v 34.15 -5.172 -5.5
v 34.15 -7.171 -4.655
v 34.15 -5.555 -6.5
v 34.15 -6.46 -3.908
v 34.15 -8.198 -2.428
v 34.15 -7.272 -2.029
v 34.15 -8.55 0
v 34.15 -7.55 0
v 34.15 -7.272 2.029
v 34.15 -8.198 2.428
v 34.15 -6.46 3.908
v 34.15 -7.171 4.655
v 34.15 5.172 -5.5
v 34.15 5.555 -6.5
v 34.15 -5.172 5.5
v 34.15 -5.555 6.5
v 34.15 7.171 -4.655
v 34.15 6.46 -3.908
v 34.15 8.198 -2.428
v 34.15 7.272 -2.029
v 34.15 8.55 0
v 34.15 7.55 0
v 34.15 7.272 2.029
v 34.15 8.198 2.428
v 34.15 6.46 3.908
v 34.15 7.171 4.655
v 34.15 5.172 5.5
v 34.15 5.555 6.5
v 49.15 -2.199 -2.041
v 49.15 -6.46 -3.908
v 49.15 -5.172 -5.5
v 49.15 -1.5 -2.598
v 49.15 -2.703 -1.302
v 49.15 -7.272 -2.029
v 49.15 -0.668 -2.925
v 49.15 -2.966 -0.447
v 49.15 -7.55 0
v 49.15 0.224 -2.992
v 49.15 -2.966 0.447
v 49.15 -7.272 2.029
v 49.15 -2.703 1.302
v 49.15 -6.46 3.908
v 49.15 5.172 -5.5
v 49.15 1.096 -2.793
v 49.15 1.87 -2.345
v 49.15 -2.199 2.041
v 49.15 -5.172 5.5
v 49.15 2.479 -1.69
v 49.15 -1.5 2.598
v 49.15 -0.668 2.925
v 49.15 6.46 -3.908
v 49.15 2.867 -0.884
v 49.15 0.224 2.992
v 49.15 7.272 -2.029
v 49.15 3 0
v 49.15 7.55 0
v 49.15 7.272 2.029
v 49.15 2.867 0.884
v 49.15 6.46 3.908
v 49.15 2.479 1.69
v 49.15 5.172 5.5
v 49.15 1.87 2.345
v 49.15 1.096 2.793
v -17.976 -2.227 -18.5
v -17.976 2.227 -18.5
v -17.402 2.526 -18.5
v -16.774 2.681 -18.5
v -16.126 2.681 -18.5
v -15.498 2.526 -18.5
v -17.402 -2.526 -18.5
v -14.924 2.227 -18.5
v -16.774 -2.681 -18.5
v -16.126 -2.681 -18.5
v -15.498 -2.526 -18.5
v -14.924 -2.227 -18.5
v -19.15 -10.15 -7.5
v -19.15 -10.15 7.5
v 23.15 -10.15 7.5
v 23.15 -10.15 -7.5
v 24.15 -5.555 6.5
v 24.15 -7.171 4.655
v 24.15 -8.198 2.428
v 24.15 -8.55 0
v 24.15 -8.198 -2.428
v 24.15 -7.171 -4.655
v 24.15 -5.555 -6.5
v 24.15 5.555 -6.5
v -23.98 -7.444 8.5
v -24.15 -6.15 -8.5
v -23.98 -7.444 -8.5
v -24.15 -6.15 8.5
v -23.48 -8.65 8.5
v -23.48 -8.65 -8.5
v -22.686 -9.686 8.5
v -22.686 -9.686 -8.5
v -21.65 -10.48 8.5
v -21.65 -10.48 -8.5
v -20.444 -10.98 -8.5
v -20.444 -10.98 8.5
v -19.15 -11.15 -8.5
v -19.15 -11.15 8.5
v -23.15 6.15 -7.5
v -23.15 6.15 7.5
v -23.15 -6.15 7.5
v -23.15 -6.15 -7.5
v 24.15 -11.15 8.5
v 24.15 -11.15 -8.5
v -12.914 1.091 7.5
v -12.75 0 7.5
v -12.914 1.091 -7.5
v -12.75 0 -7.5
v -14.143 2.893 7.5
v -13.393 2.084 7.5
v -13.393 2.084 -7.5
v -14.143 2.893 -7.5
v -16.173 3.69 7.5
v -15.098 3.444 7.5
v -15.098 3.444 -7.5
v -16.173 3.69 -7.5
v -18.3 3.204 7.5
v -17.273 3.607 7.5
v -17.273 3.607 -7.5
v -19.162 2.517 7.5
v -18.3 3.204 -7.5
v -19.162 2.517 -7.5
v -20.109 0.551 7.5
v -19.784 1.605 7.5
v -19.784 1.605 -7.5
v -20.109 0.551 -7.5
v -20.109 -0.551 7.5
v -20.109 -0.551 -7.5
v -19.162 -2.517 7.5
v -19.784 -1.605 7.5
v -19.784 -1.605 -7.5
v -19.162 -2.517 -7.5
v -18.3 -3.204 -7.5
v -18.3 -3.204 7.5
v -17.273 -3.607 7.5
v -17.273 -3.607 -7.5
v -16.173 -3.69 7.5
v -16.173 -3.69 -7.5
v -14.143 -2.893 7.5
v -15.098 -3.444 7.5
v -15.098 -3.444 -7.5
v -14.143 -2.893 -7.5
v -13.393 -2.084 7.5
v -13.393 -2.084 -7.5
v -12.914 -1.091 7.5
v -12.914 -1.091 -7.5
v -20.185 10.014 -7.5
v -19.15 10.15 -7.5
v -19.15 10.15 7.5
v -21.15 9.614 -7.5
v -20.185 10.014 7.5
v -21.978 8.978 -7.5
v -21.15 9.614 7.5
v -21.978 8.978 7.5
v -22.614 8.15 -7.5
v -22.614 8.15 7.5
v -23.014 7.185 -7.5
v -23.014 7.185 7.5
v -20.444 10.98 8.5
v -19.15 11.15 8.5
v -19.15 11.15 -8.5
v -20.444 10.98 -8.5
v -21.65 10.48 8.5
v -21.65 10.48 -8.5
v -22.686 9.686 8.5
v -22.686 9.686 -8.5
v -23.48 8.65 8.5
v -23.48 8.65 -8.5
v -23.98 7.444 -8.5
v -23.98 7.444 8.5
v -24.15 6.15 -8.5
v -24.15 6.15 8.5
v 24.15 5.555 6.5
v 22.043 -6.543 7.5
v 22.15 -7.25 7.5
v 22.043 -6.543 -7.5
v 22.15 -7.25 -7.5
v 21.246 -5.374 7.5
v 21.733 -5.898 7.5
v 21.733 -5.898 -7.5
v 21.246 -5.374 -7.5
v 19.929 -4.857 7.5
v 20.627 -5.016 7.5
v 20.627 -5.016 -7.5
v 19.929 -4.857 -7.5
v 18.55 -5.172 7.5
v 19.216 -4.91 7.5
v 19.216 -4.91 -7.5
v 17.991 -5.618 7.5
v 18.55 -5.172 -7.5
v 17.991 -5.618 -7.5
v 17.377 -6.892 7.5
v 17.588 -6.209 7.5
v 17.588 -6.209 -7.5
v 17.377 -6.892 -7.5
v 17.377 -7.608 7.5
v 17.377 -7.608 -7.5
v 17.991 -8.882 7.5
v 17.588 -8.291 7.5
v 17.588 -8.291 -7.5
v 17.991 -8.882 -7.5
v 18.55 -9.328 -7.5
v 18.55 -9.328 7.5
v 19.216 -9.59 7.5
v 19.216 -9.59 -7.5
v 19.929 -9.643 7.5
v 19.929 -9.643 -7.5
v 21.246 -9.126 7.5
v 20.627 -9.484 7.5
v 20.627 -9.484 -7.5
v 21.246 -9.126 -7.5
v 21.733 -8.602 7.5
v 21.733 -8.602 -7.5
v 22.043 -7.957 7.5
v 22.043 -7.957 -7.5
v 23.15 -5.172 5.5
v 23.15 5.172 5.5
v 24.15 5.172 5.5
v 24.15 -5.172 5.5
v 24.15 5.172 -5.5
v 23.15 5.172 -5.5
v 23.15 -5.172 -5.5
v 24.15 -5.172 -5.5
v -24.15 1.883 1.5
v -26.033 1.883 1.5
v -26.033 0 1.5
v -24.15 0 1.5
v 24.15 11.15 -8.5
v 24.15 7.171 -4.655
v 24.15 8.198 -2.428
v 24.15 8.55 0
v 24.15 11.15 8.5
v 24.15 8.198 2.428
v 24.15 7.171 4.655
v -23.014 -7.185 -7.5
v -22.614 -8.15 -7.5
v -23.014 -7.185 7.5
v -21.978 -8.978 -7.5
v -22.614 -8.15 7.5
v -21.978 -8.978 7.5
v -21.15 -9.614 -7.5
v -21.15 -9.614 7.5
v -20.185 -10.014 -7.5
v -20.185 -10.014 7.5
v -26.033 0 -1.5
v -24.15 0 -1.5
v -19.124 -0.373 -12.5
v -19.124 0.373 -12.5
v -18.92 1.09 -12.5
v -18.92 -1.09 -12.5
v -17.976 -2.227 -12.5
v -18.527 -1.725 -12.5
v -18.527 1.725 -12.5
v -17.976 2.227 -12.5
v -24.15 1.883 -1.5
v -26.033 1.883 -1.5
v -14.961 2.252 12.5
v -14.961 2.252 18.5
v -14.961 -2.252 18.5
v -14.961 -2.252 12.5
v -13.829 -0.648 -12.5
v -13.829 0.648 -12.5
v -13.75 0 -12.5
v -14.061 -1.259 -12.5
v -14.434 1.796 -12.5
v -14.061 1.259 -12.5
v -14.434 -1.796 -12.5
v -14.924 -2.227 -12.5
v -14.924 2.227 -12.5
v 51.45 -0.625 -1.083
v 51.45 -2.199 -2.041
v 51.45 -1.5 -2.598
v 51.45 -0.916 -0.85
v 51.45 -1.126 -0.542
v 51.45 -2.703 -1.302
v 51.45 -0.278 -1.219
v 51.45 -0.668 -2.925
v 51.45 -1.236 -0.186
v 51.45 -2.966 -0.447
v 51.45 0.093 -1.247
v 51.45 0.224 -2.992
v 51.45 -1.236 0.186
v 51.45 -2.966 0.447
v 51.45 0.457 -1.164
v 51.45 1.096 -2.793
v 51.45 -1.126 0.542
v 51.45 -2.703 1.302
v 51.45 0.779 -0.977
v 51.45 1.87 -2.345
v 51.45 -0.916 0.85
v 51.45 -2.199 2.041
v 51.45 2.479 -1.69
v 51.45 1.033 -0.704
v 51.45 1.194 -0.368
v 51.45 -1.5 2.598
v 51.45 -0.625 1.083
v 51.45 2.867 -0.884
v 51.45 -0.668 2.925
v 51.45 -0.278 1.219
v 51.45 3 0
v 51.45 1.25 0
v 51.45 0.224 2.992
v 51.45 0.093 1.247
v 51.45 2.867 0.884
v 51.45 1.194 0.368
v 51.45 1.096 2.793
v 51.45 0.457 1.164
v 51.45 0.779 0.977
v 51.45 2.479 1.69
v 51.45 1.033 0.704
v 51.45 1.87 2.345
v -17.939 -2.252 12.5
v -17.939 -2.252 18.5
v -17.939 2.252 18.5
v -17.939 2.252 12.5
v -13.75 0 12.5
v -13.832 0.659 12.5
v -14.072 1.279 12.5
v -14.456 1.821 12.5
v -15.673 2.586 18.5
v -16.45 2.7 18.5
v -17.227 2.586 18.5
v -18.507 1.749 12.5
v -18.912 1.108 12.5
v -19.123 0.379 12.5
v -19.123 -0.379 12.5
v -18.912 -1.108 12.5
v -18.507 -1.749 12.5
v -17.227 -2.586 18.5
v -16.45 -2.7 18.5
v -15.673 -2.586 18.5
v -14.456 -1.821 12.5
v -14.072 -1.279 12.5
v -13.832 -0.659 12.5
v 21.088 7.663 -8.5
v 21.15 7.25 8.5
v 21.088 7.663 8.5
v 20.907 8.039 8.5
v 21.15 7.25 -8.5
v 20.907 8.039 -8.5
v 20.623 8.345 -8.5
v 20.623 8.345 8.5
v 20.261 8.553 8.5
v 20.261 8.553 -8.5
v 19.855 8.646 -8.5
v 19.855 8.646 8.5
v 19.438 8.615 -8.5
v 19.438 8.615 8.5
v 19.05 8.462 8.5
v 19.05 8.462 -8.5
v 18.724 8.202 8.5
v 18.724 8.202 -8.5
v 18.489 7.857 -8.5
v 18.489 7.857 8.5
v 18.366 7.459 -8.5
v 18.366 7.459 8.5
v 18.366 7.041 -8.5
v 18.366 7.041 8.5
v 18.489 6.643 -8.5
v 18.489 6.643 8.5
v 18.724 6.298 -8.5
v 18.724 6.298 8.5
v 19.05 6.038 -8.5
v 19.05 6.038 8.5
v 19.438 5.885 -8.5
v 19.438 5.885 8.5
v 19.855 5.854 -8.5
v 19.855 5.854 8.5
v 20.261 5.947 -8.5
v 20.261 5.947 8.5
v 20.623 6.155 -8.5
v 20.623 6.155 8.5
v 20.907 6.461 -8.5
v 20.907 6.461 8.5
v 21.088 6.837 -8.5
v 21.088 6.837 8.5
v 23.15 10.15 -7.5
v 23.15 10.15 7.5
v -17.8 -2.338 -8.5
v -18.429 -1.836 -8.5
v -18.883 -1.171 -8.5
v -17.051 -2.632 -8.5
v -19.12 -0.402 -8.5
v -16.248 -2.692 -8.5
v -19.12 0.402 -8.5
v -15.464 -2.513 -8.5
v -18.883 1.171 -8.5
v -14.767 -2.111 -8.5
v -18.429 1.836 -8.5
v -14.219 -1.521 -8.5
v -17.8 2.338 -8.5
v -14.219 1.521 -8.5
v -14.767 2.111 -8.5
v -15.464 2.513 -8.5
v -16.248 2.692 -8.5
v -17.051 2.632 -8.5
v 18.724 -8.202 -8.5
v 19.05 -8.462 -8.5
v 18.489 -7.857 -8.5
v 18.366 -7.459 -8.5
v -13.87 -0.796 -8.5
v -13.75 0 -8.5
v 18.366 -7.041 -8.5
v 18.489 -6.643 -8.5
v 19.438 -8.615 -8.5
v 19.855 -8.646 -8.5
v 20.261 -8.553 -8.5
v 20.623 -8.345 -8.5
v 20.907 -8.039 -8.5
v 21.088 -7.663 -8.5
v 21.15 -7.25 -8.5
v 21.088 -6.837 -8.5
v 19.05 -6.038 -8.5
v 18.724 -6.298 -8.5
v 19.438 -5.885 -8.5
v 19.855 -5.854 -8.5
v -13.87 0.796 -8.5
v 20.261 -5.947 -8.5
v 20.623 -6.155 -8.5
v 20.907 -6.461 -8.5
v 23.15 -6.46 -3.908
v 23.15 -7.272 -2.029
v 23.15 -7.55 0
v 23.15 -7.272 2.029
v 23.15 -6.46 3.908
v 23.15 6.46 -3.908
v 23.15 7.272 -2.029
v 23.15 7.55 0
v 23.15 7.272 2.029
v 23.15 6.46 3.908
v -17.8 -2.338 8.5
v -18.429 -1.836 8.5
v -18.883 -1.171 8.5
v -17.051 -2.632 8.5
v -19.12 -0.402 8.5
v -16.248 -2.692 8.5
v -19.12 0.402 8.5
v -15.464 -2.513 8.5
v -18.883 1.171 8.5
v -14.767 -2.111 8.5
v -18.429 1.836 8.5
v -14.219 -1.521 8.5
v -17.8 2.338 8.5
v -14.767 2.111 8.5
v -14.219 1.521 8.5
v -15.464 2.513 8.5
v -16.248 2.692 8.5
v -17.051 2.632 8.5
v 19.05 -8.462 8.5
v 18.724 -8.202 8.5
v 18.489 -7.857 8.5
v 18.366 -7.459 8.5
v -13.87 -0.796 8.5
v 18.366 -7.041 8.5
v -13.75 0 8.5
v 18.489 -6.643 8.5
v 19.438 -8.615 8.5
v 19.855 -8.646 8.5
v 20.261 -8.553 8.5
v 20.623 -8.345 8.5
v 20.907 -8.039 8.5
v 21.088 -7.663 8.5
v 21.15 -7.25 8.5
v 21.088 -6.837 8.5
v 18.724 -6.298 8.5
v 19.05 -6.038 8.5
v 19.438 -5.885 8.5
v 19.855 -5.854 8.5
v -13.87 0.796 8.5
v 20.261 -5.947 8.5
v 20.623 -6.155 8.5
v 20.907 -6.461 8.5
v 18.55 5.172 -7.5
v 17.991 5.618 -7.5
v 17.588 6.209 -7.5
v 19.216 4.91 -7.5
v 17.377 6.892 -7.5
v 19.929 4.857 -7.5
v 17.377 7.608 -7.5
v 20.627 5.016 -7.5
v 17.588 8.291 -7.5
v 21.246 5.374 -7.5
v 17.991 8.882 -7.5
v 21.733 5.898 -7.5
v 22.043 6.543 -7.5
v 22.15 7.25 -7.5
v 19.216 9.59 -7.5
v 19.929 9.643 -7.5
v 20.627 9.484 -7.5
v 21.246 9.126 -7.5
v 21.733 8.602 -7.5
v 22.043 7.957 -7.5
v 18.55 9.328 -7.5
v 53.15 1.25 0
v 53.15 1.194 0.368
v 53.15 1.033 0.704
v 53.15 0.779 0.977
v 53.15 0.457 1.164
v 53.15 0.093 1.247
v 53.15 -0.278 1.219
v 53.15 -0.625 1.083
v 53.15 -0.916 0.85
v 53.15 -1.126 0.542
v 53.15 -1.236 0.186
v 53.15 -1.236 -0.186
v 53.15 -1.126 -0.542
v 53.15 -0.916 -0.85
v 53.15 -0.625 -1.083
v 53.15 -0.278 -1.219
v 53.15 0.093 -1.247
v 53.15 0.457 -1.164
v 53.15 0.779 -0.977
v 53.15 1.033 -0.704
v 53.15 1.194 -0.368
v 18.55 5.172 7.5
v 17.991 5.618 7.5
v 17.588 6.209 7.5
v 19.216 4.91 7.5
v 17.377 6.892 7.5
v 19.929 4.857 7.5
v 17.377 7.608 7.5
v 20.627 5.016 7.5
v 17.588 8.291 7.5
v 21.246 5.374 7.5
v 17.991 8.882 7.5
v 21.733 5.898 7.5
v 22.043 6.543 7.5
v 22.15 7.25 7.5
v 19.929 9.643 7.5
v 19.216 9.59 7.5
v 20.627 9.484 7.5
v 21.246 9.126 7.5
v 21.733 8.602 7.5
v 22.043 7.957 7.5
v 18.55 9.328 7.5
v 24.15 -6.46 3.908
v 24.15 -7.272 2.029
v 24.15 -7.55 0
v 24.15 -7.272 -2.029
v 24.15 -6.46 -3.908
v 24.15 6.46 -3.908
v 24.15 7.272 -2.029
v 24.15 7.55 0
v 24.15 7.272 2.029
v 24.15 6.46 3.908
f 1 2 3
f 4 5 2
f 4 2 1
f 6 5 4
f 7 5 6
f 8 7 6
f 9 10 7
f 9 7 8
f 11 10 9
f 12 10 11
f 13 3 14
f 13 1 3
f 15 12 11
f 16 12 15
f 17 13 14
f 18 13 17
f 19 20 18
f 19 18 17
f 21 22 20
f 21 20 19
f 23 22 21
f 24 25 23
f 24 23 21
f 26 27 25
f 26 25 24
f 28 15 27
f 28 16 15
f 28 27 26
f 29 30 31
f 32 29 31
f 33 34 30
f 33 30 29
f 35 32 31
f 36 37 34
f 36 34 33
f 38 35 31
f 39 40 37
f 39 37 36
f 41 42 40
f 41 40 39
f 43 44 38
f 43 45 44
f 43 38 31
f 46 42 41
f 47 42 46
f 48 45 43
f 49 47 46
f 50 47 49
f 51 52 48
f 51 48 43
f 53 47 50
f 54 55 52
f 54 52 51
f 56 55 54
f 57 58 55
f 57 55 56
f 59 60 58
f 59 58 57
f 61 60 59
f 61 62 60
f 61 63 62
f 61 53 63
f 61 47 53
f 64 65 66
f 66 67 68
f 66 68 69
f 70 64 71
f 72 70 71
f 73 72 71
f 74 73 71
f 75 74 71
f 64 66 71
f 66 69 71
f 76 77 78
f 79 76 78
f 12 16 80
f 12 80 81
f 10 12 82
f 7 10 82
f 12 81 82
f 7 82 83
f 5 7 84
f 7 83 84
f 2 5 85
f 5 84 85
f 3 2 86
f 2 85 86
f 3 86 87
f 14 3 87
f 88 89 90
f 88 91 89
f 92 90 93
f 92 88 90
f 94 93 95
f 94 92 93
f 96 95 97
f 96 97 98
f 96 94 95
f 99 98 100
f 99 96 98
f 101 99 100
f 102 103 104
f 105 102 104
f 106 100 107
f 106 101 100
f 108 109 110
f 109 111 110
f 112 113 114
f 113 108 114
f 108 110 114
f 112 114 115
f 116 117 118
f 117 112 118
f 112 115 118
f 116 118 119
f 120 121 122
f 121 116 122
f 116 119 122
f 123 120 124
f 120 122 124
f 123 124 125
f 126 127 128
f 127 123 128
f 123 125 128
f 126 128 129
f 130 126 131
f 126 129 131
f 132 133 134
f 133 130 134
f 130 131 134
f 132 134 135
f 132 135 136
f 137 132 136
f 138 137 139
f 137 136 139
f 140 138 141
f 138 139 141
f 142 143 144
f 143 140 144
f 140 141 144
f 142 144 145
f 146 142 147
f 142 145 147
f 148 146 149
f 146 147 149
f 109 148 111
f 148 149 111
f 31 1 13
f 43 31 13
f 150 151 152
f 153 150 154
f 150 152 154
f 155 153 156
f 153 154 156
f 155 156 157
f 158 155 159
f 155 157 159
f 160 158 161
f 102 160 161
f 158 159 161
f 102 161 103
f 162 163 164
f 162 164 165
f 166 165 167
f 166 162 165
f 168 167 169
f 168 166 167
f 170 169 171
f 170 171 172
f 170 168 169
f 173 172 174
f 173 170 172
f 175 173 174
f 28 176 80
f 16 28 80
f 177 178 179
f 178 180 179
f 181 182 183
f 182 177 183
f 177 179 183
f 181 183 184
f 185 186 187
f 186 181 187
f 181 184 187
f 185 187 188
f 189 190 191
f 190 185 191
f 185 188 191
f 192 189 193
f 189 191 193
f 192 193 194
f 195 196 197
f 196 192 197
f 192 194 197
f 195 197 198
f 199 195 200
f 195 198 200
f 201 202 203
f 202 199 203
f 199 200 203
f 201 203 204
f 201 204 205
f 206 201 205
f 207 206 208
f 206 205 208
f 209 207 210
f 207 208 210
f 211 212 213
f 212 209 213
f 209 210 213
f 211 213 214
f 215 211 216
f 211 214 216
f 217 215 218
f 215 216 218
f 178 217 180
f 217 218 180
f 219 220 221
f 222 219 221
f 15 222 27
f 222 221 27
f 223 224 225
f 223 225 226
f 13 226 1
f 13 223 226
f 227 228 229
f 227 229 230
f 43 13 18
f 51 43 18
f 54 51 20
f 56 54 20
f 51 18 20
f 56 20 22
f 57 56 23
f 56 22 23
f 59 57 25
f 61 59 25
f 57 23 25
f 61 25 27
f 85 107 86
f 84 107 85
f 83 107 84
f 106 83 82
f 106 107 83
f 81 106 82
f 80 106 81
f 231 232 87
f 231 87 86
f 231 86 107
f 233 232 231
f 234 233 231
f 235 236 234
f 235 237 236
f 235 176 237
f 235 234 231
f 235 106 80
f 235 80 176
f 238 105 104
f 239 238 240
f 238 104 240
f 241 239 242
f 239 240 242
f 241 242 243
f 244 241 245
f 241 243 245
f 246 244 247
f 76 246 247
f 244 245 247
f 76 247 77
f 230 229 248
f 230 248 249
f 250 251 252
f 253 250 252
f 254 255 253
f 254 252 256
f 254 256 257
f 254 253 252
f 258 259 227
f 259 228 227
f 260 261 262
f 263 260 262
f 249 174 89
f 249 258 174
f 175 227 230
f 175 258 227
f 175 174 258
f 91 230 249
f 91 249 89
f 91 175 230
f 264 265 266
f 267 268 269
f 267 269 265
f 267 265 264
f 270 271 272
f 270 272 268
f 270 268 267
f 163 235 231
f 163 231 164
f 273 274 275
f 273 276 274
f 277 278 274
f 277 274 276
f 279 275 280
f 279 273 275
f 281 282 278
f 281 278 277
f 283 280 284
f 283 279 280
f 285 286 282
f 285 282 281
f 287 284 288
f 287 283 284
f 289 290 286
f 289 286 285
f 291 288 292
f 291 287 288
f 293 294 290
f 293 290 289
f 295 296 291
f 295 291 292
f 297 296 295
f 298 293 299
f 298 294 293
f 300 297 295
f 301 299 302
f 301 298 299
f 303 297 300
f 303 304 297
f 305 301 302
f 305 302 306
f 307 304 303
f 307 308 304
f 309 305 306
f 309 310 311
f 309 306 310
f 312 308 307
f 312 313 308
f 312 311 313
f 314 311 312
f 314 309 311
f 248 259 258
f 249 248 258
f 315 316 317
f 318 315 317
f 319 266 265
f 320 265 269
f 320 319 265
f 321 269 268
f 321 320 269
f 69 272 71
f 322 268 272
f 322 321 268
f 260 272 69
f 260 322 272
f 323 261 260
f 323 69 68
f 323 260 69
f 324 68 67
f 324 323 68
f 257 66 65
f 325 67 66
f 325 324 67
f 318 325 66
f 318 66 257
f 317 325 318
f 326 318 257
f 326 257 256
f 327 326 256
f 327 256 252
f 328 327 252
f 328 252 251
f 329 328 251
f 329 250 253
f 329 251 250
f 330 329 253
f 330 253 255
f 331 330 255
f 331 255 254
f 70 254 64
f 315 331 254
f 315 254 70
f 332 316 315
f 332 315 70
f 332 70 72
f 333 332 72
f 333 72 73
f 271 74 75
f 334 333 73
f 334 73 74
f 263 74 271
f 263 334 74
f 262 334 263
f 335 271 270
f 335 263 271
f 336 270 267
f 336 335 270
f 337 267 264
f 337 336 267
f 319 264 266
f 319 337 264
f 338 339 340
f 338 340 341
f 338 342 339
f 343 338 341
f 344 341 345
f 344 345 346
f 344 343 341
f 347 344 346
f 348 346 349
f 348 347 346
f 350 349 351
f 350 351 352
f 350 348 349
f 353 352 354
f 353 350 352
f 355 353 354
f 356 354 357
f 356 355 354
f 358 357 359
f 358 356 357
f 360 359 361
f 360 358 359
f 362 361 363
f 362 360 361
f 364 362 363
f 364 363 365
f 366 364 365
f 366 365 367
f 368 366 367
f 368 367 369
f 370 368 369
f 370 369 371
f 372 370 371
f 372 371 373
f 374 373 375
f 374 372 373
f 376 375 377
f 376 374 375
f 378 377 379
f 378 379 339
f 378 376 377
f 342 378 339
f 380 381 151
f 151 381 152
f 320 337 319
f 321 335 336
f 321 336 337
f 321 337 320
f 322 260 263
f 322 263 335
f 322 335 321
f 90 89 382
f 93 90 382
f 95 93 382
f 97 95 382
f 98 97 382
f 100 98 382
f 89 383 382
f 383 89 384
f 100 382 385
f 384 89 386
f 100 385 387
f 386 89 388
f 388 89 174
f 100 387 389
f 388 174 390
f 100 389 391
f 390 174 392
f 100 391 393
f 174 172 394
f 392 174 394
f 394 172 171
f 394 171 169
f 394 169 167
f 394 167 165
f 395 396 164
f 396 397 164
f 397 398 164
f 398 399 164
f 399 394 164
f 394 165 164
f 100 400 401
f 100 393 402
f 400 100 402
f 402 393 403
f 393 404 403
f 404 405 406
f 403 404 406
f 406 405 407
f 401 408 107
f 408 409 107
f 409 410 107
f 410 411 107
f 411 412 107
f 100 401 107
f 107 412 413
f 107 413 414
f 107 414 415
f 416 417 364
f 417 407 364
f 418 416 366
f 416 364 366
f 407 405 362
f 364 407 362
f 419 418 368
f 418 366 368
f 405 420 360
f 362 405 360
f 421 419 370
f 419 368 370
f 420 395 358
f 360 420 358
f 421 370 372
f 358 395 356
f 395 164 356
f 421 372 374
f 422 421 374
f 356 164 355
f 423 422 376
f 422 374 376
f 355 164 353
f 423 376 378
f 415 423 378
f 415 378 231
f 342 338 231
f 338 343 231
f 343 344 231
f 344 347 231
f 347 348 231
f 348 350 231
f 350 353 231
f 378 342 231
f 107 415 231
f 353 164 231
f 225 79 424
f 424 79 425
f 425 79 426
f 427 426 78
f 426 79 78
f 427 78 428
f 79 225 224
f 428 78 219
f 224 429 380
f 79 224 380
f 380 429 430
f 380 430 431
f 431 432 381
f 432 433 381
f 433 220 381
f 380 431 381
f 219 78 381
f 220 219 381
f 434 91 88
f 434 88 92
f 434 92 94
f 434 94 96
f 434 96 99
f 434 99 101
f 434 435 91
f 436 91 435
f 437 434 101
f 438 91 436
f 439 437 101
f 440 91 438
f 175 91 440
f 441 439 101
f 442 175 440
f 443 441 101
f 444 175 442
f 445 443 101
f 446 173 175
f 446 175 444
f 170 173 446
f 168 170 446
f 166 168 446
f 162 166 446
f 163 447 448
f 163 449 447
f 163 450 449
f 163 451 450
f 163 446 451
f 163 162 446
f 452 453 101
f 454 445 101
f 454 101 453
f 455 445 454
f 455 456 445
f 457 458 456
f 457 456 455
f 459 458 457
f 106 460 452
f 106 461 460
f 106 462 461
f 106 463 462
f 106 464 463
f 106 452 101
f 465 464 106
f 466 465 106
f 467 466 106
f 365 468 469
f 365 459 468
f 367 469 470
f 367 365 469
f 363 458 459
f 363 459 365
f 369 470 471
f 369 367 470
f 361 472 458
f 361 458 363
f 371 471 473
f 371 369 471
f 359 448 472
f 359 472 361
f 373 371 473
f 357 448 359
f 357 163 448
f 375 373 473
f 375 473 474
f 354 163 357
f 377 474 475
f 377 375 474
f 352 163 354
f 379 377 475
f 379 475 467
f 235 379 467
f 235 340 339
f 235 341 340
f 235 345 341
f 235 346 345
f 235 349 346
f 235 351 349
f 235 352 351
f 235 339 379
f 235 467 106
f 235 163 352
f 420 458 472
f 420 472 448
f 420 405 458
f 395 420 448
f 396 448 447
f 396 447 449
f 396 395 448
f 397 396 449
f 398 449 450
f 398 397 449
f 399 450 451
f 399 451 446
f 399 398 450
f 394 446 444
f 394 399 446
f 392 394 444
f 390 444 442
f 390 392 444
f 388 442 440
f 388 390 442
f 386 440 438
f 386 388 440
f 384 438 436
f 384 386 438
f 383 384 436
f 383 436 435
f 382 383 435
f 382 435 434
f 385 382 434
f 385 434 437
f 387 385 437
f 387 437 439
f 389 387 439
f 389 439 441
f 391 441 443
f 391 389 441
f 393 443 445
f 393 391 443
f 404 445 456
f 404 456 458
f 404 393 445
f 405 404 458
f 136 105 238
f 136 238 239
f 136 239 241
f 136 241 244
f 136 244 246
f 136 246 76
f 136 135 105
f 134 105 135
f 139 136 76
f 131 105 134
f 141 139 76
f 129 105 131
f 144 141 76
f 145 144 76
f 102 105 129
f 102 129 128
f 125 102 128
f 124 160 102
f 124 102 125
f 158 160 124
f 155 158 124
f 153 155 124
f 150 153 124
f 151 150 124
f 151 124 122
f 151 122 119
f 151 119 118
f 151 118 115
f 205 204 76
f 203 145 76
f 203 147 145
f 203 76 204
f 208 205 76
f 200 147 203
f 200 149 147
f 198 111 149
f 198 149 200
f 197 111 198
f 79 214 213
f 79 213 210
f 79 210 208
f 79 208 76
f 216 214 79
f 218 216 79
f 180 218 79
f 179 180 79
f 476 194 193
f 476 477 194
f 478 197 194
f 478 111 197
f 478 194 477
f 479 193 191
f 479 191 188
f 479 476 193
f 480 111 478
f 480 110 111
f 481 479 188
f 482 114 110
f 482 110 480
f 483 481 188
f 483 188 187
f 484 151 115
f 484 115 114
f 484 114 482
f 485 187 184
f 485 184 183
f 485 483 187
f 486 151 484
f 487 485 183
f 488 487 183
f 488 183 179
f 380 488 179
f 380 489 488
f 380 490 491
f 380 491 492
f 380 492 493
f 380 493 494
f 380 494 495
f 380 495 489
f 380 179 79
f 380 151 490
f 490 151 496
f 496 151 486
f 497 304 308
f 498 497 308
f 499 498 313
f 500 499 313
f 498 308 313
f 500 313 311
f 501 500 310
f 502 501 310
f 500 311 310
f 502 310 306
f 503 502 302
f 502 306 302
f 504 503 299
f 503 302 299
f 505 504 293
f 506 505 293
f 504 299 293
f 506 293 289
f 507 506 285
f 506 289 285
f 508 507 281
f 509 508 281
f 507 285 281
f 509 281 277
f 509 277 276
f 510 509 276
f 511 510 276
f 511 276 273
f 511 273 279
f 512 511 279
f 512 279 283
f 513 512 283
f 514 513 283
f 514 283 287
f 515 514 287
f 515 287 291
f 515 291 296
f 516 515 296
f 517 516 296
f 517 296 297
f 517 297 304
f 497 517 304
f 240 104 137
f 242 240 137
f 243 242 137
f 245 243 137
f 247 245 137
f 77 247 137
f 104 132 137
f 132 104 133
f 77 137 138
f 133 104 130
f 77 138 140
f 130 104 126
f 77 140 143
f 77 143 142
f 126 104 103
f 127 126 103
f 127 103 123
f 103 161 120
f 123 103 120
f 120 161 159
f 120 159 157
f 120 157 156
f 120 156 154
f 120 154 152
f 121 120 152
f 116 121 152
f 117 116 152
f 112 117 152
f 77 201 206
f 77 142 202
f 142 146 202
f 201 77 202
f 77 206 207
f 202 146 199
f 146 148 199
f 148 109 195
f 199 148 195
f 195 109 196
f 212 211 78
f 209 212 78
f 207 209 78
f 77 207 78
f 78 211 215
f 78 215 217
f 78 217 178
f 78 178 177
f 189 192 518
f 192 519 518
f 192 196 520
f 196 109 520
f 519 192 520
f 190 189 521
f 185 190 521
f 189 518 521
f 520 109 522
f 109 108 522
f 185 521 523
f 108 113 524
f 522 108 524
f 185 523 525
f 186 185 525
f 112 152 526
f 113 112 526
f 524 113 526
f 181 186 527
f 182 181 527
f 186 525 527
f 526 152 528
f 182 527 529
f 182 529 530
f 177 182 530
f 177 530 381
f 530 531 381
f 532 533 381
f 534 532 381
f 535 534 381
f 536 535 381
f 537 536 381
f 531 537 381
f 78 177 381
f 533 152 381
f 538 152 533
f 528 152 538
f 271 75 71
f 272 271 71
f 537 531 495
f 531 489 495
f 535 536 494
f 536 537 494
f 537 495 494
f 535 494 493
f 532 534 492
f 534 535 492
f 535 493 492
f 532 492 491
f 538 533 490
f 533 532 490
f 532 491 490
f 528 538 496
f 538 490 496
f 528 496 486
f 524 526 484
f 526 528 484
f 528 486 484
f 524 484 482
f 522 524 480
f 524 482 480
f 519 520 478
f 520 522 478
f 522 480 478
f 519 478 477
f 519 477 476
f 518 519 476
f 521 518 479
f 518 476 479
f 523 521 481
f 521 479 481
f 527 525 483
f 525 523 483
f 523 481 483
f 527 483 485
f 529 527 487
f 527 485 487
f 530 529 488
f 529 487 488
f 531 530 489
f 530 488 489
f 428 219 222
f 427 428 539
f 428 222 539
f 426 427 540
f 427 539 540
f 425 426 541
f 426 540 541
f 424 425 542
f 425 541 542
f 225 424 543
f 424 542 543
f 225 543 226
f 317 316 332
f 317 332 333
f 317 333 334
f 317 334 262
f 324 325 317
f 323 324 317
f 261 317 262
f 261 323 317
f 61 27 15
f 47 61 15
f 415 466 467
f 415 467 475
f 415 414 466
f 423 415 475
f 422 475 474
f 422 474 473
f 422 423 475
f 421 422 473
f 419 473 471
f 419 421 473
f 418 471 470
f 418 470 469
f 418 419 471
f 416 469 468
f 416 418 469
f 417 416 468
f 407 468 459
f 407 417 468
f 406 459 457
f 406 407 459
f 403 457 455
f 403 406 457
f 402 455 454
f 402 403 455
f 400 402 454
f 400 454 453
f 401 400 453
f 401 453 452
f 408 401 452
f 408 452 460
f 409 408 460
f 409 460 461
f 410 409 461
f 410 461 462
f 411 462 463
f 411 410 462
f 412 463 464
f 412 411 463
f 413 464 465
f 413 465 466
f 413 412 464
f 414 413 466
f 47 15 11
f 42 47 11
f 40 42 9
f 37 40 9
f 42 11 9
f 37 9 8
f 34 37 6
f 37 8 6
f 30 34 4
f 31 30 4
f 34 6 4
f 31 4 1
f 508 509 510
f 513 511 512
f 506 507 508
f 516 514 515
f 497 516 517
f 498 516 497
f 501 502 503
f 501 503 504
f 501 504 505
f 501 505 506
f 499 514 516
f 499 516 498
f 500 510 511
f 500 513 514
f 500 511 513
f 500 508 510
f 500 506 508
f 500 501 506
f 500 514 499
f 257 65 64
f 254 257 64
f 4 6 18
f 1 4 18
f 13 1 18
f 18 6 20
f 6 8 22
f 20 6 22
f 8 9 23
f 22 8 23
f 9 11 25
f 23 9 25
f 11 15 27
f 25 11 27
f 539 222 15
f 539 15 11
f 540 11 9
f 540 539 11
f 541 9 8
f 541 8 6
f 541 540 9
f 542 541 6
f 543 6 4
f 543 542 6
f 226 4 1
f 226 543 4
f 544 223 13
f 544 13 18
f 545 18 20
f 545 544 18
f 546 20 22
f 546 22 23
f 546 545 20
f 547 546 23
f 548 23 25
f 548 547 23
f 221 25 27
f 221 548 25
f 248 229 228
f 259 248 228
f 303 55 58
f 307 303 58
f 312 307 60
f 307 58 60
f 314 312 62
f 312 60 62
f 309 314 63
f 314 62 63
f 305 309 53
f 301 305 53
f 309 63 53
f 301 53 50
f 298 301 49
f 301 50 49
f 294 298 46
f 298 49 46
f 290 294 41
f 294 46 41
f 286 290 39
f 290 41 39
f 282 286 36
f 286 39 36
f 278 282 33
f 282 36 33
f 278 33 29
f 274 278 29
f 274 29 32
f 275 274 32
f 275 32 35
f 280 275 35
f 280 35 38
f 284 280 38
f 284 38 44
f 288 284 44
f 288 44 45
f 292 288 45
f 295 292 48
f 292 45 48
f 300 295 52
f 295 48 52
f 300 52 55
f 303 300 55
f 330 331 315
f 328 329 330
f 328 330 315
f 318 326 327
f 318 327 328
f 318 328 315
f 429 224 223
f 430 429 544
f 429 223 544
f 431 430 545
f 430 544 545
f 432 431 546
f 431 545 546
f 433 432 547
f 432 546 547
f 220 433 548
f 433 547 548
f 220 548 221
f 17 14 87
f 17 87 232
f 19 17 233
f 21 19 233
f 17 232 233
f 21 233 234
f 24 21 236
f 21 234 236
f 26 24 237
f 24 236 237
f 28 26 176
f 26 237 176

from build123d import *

# Parameters (mm, degrees)
F0_W         = 7.9850807097
F0_H         = 22.3
F0_R         = 1.4
F0_R_2       = 2.7
F1_DEPTH     = 8.5
F0_W_2       = 1.8826620857
F0_H_2       = 1.8826614193
F2_DEPTH     = 1.5
F3_DEPTH     = 18.5
F5_DEPTH     = 10
F6_T         = 1
F6_T3_DEPTH  = 13.109005356
F6_T5_DEPTH  = 5
F6_T7_DEPTH  = 3.8826614193
F6_T10_ANGLE = 98.969647871
F6_T12_ANGLE = 98.969647871
F8_DEPTH     = 15
F9_R         = 3
F9_R_2       = 1.25
F10_DEPTH    = 2.3
F11_DEPTH    = 4
F13_DEPTH    = 6
F15_DEPTH    = 6


# Not quite as in the source:
# - a shell that OpenCascade refuses in one call is made with other operations: the cavity is built on its own and cut out


with BuildPart() as f1:
    # F0 (on Top) → F1 (new body, symmetric)
    with BuildSketch(Plane.XY):
        with Locations((20.1574596452, 0)):
            Rectangle(F0_W, F0_H)
        with Locations((19.75, -7.25)):
            Circle(F0_R, mode=Mode.SUBTRACT)
        with Locations((19.75, 7.25)):
            Circle(F0_R, mode=Mode.SUBTRACT)
        with BuildLine():
            Line((-19.15, -11.15), (16.1649192903, -11.15))
            Line((16.1649192903, -11.15), (16.1649192903, 11.15))
            Line((16.1649192903, 11.15), (-19.15, 11.15))
            ThreePointArc((-19.15, 11.15), (-22.6855339059, 9.6855339059), (-24.15, 6.15))
            Line((-24.15, 6.15), (-24.15, 1.8826614193))
            Line((-24.15, 1.8826614193), (-24.15, 0))
            Line((-24.15, 0), (-24.15, -6.15))
            ThreePointArc((-24.15, -6.15), (-22.6855339059, -9.6855339059), (-19.15, -11.15))
        make_face()
        with Locations((-16.45, 0)):
            Circle(F0_R_2, mode=Mode.SUBTRACT)
    extrude(amount=F1_DEPTH, both=True)

    # F0 (on Top) → F2 (join, symmetric)
    with BuildSketch(Plane.XY):
        with Locations((-25.0913310429, 0.9413307097)):
            Rectangle(F0_W_2, F0_H_2)
    extrude(amount=F2_DEPTH, both=True)

    # F4 (on face) → F5 (join)
    with BuildSketch(Plane.YZ.offset(24.15)):
        with BuildLine():
            Line((5.554502678, 6.5), (-5.554502678, 6.5))
            ThreePointArc((-5.554502678, 6.5), (-8.55, 0), (-5.554502678, -6.5))
            Line((-5.554502678, -6.5), (5.554502678, -6.5))
            ThreePointArc((5.554502678, -6.5), (8.55, 0), (5.554502678, 6.5))
        make_face()
    extrude(amount=F5_DEPTH)

    # F6: shell of thickness 1, made by hand


with BuildPart() as f3:
    # F0 (on Top) → F3 (new body, symmetric)
    with BuildSketch(Plane.XY):
        with Locations((-16.45, 0)):
            Circle(F0_R_2)
    extrude(amount=F3_DEPTH, both=True)

    # F12 (on face) → F13 (cut)
    with BuildSketch(Plane.XY.offset(18.5)):
        with BuildLine():
            ThreePointArc((-17.9390255067, 2.2522884008), (-19.15, 0), (-17.9390255067, -2.2522884008))
            Line((-17.9390255067, -2.2522884008), (-17.9390255067, 2.2522884008))
        make_face()
        with BuildLine():
            Line((-14.9609744933, 2.2522884008), (-14.9609744933, -2.2522884008))
            ThreePointArc((-14.9609744933, -2.2522884008), (-14.0719368314, -1.2785990638), (-13.75, 0))
            ThreePointArc((-13.75, 0), (-14.0719368314, 1.2785990638), (-14.9609744933, 2.2522884008))
        make_face()
    extrude(amount=-F13_DEPTH, mode=Mode.SUBTRACT)

    # F14 (on face) → F15 (cut)
    with BuildSketch(Plane(origin=(0, 0, -18.5), x_dir=(1, 0, 0), z_dir=(0, 0, -1))):
        with BuildLine():
            Line((-17.9761945408, -2.2272696792), (-17.9761945408, 2.2272696792))
            ThreePointArc((-17.9761945408, 2.2272696792), (-19.15, 0), (-17.9761945408, -2.2272696792))
        make_face()
        with BuildLine():
            ThreePointArc((-13.75, 0), (-14.0614099075, 1.2588238042), (-14.9238054592, 2.2272696792))
            Line((-14.9238054592, 2.2272696792), (-14.9238054592, -2.2272696792))
            ThreePointArc((-14.9238054592, -2.2272696792), (-14.0614099075, -1.2588238042), (-13.75, 0))
        make_face()
    extrude(amount=-F15_DEPTH, mode=Mode.SUBTRACT)


with BuildPart() as f6_core1:
    # F6_t2: copy of F1
    add(f1.part)

    # the walls: a layer under each face that stays
    f6_faces = [f6_core1.faces().sort_by_distance(p)[0] for p in [
        (24.15, -7.4333333333, -5.6666666667),
        (0, 0, -8.5),
        (2.5, -11.15, 0),
        (2.5, 11.15, 0),
        (0, 0, 8.5),
        (29.15, 0, -6.5),
        (29.15, 8.55, 0),
        (29.15, 0, 6.5),
        (29.15, -8.55, 0),
        (-22.6855339059, 9.6855339059, 0),
        (-24.15, 4.1, -5.6666666667),
        (-22.6855339059, -9.6855339059, 0),
        (18.35, -7.25, 0),
        (18.35, 7.25, 0),
        (-19.15, 0, 0),
        (-25.0913310429, 1.8826614193, 0),
        (-25.0913310429, 0.9413307097, -1.5),
        (-25.0913310429, 0, 0),
        (-25.0913310429, 0.9413307097, 1.5),
        (-26.0326620857, 0.9413307097, 0),
    ]]
    thicken(f6_faces, amount=-F6_T, mode=Mode.SUBTRACT)

    # F6_s4 → F6_t3 (cut)
    with BuildSketch(Plane.XZ.offset(-6.554502678)):
        Polygon((24.16, -6.51), (23.15, -6.5), (23.15, -5.5), (24.15, -5.5), align=None)
        Polygon((24.16, 6.51), (23.15, 6.5), (23.15, 5.5), (24.15, 5.5), align=None)
    extrude(amount=F6_T3_DEPTH, mode=Mode.SUBTRACT)

    # F6_s6 → F6_t5 (cut)
    with BuildSketch(Plane.XY.offset(-2.5)):
        Polygon((-24.16, 1.8926614193), (-23.15, 1.8826614193), (-23.15, 0.8826614193), (-24.15, 0.8826614193), align=None)
        Polygon((-24.16, -0.01), (-23.15, 0), (-23.15, 1), (-24.15, 1), align=None)
    extrude(amount=F6_T5_DEPTH, mode=Mode.SUBTRACT)

    # F6_s8 → F6_t7 (cut)
    with BuildSketch(Plane.XZ.offset(-2.8826614193)):
        Polygon((-24.16, -1.51), (-23.15, -1.5), (-23.15, -0.5), (-24.15, -0.5), align=None)
        Polygon((-24.16, 1.51), (-23.15, 1.5), (-23.15, 0.5), (-24.15, 0.5), align=None)
    extrude(amount=F6_T7_DEPTH, mode=Mode.SUBTRACT)

    # F6_s9 → F6_t10 (revolve, cut)
    with BuildSketch(Plane(origin=(0, 0, 0), x_dir=(1, 0, 0), z_dir=(0, -0.7602339181, -0.649649436))):
        Polygon((24.16, -8.56), (23.15, -8.55), (23.15, -7.55), (24.15, -7.55), align=None)
    revolve(axis=Axis((24.15, 0, 0), (1, 0, 0)), revolution_arc=F6_T10_ANGLE, mode=Mode.SUBTRACT)

    # F6_s11 → F6_t12 (revolve, cut)
    with BuildSketch(Plane(origin=(0, 0, 0), x_dir=(1, 0, 0), z_dir=(0, 0.7602339181, 0.649649436))):
        Polygon((24.16, -8.56), (23.15, -8.55), (23.15, -7.55), (24.15, -7.55), align=None)
    revolve(axis=Axis((24.15, 0, 0), (1, 0, 0)), revolution_arc=F6_T12_ANGLE, mode=Mode.SUBTRACT)


with BuildPart() as f1_1:
    add(f1.part)

    # what is left inside the walls is the cavity
    f6_cavity = [f6_core1.part.solids().sort_by_distance(p)[0] for p in [
        (0, -3.383333, 7.49),
    ]]
    add(f6_cavity, mode=Mode.SUBTRACT)


with BuildPart() as f8:
    # F7 (on face) → F8 (new body)
    with BuildSketch(Plane.YZ.offset(34.15)):
        with BuildLine():
            Line((5.1722818949, 5.5), (-5.1722818949, 5.5))
            ThreePointArc((-5.1722818949, 5.5), (-7.55, 0), (-5.1722818949, -5.5))
            Line((-5.1722818949, -5.5), (5.1722818949, -5.5))
            ThreePointArc((5.1722818949, -5.5), (7.55, 0), (5.1722818949, 5.5))
        make_face()
    extrude(amount=F8_DEPTH)

    # F9 (on face) → F10 (join)
    with BuildSketch(Plane.YZ.offset(49.15)):
        Circle(F9_R)
        Circle(F9_R_2, mode=Mode.SUBTRACT)
    extrude(amount=F10_DEPTH)

    # F11 (add): a face of the model
    f11_faces = [f8.faces().sort_by_distance(p)[0] for p in [
        (49.15, 0, 0),
    ]]
    extrude(f11_faces, amount=F11_DEPTH)


solid = Compound([f3.part, f1_1.part, f8.part])
